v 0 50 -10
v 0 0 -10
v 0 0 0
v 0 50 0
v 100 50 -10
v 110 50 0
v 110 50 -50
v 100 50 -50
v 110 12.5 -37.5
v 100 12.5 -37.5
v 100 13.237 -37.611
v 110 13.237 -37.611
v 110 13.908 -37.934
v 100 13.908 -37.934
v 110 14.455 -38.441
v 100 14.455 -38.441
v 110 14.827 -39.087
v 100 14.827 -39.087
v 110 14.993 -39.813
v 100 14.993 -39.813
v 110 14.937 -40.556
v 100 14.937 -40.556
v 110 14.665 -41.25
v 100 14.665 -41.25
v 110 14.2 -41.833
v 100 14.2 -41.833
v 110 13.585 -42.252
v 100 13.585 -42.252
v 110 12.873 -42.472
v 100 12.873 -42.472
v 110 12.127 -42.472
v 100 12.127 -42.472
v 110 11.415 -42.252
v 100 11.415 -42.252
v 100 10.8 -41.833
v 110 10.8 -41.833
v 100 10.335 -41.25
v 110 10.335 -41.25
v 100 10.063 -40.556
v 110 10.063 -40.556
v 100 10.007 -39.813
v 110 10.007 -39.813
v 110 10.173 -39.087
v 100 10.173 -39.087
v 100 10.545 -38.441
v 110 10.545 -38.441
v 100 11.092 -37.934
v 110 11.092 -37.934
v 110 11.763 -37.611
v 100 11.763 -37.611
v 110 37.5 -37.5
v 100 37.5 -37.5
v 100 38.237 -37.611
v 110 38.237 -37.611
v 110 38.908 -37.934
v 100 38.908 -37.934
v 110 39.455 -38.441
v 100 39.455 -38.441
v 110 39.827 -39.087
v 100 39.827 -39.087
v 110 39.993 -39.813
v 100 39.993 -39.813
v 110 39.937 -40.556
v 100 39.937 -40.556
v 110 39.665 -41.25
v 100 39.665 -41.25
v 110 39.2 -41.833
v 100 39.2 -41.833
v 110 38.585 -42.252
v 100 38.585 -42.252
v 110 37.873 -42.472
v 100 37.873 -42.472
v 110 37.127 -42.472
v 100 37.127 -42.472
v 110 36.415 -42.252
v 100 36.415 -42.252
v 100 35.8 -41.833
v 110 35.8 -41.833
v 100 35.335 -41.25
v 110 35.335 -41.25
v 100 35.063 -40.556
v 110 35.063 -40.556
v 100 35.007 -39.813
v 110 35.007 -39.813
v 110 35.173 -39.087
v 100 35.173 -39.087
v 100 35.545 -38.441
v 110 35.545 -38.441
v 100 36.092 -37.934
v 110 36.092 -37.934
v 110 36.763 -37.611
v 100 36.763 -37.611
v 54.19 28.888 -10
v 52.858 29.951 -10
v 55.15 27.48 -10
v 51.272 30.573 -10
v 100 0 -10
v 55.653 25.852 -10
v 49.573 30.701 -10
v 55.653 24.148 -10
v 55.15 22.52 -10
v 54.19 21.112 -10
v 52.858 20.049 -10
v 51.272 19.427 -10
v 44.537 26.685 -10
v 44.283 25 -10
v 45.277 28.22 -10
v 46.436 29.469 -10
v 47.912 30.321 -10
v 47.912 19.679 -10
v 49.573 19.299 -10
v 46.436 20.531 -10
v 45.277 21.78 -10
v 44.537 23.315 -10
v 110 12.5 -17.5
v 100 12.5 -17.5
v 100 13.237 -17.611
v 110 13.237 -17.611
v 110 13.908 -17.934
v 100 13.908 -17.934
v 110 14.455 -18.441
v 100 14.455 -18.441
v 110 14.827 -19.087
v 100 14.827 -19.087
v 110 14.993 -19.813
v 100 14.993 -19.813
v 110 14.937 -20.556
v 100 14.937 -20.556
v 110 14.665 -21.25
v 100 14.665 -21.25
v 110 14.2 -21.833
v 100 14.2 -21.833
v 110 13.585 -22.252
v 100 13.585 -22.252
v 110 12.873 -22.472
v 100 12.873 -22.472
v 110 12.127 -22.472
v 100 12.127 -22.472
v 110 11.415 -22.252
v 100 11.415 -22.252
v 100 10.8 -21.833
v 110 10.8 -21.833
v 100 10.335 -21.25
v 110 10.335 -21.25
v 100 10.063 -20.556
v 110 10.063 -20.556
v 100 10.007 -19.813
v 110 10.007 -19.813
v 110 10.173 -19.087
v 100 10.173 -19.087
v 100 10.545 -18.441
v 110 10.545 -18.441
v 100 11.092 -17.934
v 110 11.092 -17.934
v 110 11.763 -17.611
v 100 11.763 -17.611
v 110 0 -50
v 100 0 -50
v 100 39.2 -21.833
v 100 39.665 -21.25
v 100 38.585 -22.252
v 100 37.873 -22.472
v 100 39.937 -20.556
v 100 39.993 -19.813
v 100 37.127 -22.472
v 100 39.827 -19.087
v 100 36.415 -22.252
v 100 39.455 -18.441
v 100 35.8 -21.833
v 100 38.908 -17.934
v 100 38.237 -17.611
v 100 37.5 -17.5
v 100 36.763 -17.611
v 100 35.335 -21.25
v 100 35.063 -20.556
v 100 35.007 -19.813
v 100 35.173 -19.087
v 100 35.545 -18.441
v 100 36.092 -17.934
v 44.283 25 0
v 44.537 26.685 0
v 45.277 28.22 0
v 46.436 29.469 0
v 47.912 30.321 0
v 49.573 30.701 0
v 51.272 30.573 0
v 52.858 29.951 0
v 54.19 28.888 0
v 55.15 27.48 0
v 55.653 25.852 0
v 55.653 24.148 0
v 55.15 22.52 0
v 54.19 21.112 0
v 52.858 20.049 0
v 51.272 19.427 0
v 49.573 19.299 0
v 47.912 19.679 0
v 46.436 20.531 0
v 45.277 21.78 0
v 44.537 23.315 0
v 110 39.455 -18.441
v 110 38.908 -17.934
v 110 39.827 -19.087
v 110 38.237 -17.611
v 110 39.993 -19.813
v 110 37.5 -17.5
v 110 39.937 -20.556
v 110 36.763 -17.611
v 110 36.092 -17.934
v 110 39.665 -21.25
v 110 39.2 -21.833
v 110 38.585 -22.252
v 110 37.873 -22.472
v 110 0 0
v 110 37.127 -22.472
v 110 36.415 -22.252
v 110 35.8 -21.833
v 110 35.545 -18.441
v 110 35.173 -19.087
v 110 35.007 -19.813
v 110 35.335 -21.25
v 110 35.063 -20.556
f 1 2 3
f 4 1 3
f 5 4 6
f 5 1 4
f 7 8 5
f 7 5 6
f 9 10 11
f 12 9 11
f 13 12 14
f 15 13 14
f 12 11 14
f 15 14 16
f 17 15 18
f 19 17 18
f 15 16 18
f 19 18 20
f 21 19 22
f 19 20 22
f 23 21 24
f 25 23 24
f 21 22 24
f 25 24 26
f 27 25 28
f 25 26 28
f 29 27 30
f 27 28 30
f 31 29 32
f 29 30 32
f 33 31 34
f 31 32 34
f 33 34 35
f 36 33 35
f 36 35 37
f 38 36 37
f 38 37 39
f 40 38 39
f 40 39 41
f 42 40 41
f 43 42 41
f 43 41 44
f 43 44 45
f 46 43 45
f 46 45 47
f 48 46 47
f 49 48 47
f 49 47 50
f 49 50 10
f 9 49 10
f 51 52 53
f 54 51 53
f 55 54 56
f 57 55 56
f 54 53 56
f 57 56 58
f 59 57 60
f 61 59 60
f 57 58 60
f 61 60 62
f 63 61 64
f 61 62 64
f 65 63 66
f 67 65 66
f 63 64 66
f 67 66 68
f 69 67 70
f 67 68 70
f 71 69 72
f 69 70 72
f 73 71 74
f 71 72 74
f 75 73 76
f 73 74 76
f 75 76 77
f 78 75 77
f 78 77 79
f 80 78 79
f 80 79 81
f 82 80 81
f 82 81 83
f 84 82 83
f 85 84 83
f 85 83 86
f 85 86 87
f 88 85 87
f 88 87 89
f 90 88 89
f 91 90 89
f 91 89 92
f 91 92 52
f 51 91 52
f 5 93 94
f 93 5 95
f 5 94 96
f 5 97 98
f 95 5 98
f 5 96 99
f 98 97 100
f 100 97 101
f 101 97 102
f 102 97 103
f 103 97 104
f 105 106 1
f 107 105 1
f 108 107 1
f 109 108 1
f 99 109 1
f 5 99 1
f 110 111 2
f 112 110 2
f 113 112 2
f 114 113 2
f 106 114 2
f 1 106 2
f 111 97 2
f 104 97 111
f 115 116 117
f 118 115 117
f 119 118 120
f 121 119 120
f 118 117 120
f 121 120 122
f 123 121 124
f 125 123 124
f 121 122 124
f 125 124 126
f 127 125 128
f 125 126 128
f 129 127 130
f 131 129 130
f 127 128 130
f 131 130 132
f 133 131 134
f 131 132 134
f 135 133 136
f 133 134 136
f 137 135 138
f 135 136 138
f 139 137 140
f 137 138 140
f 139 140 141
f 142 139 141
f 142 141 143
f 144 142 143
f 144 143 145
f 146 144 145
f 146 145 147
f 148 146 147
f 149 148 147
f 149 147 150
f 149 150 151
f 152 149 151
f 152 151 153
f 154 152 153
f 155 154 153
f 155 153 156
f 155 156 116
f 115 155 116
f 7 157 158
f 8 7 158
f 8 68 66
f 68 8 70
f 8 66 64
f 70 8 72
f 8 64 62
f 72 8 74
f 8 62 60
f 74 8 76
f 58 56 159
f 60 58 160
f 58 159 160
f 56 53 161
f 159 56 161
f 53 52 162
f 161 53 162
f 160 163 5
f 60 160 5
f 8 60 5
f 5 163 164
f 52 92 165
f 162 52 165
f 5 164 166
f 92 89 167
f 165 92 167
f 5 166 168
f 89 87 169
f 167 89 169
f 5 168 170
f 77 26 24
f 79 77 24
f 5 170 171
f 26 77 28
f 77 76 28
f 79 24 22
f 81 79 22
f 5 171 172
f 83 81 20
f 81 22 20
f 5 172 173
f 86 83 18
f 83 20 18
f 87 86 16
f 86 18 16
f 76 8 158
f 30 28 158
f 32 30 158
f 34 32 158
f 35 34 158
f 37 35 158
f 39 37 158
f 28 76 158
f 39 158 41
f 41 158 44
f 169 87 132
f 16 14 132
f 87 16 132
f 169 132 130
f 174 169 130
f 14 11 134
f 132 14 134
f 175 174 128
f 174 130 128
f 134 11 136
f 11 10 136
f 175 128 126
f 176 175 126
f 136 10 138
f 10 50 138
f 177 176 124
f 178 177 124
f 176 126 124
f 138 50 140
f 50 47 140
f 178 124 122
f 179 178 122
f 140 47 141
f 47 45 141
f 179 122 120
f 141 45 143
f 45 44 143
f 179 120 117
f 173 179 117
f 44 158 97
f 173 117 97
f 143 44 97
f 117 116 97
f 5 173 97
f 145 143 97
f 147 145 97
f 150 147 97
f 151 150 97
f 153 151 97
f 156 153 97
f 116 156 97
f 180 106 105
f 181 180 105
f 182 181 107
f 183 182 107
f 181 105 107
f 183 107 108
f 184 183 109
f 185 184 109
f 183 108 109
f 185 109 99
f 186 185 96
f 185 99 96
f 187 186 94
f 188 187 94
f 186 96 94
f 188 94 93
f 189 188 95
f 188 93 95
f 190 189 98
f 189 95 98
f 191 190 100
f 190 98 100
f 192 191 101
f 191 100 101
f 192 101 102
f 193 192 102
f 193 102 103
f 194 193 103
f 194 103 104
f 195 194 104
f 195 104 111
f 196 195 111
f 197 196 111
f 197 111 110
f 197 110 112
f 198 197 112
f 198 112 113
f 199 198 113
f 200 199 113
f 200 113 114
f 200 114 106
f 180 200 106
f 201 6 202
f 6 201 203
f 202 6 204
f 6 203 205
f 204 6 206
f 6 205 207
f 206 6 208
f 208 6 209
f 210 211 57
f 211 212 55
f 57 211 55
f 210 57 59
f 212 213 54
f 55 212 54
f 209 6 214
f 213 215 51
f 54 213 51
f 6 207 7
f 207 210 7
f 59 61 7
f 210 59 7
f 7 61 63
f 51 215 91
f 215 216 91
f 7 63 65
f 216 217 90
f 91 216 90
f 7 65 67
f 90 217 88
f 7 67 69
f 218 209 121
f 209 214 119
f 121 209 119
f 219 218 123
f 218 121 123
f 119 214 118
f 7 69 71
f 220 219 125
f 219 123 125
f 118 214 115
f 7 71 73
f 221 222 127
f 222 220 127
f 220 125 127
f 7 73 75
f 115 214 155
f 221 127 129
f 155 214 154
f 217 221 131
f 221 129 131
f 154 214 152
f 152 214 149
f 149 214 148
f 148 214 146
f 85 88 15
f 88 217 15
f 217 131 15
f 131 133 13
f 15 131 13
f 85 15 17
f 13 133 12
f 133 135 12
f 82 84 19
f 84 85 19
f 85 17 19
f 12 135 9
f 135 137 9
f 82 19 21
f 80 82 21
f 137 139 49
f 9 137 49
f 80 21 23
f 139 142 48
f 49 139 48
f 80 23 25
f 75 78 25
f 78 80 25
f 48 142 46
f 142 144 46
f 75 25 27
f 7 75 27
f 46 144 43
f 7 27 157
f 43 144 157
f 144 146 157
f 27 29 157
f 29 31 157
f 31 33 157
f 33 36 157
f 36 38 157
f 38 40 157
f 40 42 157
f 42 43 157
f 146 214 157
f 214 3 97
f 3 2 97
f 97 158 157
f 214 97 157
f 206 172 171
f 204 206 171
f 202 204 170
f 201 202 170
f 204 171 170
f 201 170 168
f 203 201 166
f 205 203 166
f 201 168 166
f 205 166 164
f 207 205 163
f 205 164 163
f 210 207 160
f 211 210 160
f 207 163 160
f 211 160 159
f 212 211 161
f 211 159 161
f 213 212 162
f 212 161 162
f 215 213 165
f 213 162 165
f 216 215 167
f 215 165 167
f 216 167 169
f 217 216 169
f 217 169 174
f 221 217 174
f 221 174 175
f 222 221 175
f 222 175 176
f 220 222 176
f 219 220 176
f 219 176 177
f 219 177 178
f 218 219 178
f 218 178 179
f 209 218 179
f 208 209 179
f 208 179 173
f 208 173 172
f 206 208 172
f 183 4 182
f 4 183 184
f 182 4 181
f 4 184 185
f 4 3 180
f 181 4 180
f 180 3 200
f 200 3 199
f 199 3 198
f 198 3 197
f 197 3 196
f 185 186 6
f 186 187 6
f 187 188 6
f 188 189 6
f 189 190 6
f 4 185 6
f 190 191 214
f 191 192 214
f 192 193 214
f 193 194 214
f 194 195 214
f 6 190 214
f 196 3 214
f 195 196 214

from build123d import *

# Parameters (mm, degrees)
BOSS_EXTRUDE1_DEPTH = 50
CUT_EXTRUDE1_REACH  = 129.279
SKETCH3_R           = 5.716504826
CUT_EXTRUDE2_REACH  = 124.474
SKETCH5_R           = 2.5


with BuildPart() as part:
    # Sketch2 → Boss-Extrude1 (new body)
    with BuildSketch(Plane(origin=(0, 0, 0), x_dir=(1, 0, 0), z_dir=(0, 1, 0))):
        Polygon((0, 0), (110, 0), (110, 50), (100, 50), (100, 10), (0, 10), align=None)
    extrude(amount=BOSS_EXTRUDE1_DEPTH)

    # Sketch3 → Cut-Extrude1 (cut, up to next)
    with BuildSketch(Plane(origin=(0, 0, -10), x_dir=(-1, 0, 0), z_dir=(0, 0, -1)), mode=Mode.PRIVATE) as cut_extrude1_sk1:
        with Locations((-50, 25)):
            Circle(SKETCH3_R)
    cut_extrude1_tool1 = extrude(cut_extrude1_sk1.sketch, amount=-CUT_EXTRUDE1_REACH, mode=Mode.PRIVATE) & part.part
    add(cut_extrude1_tool1.solids().sort_by_distance((50, 25, -10))[0], mode=Mode.SUBTRACT)

    # Sketch5 → Cut-Extrude2 (cut, up to next)
    with BuildSketch(Plane.ZY.offset(-100), mode=Mode.PRIVATE) as cut_extrude2_sk1:
        with Locations((-40, 12.5)):
            Circle(SKETCH5_R)
    cut_extrude2_tool1 = extrude(cut_extrude2_sk1.sketch, amount=-CUT_EXTRUDE2_REACH, mode=Mode.PRIVATE) & part.part
    # Sketch5 → Cut-Extrude2 (cut, up to next)
    with BuildSketch(Plane.ZY.offset(-100), mode=Mode.PRIVATE) as cut_extrude2_sk2:
        with Locations((-20, 12.5)):
            Circle(SKETCH5_R)
    cut_extrude2_tool2 = extrude(cut_extrude2_sk2.sketch, amount=-CUT_EXTRUDE2_REACH, mode=Mode.PRIVATE) & part.part
    # Sketch5 → Cut-Extrude2 (cut, up to next)
    with BuildSketch(Plane.ZY.offset(-100), mode=Mode.PRIVATE) as cut_extrude2_sk3:
        with Locations((-40, 37.5)):
            Circle(SKETCH5_R)
    cut_extrude2_tool3 = extrude(cut_extrude2_sk3.sketch, amount=-CUT_EXTRUDE2_REACH, mode=Mode.PRIVATE) & part.part
    # Sketch5 → Cut-Extrude2 (cut, up to next)
    with BuildSketch(Plane.ZY.offset(-100), mode=Mode.PRIVATE) as cut_extrude2_sk4:
        with Locations((-20, 37.5)):
            Circle(SKETCH5_R)
    cut_extrude2_tool4 = extrude(cut_extrude2_sk4.sketch, amount=-CUT_EXTRUDE2_REACH, mode=Mode.PRIVATE) & part.part
    add(cut_extrude2_tool1.solids().sort_by_distance((100, 12.5, -40))[0], mode=Mode.SUBTRACT)
    add(cut_extrude2_tool2.solids().sort_by_distance((100, 12.5, -20))[0], mode=Mode.SUBTRACT)
    add(cut_extrude2_tool3.solids().sort_by_distance((100, 37.5, -40))[0], mode=Mode.SUBTRACT)
    add(cut_extrude2_tool4.solids().sort_by_distance((100, 37.5, -20))[0], mode=Mode.SUBTRACT)


solid = part.part
